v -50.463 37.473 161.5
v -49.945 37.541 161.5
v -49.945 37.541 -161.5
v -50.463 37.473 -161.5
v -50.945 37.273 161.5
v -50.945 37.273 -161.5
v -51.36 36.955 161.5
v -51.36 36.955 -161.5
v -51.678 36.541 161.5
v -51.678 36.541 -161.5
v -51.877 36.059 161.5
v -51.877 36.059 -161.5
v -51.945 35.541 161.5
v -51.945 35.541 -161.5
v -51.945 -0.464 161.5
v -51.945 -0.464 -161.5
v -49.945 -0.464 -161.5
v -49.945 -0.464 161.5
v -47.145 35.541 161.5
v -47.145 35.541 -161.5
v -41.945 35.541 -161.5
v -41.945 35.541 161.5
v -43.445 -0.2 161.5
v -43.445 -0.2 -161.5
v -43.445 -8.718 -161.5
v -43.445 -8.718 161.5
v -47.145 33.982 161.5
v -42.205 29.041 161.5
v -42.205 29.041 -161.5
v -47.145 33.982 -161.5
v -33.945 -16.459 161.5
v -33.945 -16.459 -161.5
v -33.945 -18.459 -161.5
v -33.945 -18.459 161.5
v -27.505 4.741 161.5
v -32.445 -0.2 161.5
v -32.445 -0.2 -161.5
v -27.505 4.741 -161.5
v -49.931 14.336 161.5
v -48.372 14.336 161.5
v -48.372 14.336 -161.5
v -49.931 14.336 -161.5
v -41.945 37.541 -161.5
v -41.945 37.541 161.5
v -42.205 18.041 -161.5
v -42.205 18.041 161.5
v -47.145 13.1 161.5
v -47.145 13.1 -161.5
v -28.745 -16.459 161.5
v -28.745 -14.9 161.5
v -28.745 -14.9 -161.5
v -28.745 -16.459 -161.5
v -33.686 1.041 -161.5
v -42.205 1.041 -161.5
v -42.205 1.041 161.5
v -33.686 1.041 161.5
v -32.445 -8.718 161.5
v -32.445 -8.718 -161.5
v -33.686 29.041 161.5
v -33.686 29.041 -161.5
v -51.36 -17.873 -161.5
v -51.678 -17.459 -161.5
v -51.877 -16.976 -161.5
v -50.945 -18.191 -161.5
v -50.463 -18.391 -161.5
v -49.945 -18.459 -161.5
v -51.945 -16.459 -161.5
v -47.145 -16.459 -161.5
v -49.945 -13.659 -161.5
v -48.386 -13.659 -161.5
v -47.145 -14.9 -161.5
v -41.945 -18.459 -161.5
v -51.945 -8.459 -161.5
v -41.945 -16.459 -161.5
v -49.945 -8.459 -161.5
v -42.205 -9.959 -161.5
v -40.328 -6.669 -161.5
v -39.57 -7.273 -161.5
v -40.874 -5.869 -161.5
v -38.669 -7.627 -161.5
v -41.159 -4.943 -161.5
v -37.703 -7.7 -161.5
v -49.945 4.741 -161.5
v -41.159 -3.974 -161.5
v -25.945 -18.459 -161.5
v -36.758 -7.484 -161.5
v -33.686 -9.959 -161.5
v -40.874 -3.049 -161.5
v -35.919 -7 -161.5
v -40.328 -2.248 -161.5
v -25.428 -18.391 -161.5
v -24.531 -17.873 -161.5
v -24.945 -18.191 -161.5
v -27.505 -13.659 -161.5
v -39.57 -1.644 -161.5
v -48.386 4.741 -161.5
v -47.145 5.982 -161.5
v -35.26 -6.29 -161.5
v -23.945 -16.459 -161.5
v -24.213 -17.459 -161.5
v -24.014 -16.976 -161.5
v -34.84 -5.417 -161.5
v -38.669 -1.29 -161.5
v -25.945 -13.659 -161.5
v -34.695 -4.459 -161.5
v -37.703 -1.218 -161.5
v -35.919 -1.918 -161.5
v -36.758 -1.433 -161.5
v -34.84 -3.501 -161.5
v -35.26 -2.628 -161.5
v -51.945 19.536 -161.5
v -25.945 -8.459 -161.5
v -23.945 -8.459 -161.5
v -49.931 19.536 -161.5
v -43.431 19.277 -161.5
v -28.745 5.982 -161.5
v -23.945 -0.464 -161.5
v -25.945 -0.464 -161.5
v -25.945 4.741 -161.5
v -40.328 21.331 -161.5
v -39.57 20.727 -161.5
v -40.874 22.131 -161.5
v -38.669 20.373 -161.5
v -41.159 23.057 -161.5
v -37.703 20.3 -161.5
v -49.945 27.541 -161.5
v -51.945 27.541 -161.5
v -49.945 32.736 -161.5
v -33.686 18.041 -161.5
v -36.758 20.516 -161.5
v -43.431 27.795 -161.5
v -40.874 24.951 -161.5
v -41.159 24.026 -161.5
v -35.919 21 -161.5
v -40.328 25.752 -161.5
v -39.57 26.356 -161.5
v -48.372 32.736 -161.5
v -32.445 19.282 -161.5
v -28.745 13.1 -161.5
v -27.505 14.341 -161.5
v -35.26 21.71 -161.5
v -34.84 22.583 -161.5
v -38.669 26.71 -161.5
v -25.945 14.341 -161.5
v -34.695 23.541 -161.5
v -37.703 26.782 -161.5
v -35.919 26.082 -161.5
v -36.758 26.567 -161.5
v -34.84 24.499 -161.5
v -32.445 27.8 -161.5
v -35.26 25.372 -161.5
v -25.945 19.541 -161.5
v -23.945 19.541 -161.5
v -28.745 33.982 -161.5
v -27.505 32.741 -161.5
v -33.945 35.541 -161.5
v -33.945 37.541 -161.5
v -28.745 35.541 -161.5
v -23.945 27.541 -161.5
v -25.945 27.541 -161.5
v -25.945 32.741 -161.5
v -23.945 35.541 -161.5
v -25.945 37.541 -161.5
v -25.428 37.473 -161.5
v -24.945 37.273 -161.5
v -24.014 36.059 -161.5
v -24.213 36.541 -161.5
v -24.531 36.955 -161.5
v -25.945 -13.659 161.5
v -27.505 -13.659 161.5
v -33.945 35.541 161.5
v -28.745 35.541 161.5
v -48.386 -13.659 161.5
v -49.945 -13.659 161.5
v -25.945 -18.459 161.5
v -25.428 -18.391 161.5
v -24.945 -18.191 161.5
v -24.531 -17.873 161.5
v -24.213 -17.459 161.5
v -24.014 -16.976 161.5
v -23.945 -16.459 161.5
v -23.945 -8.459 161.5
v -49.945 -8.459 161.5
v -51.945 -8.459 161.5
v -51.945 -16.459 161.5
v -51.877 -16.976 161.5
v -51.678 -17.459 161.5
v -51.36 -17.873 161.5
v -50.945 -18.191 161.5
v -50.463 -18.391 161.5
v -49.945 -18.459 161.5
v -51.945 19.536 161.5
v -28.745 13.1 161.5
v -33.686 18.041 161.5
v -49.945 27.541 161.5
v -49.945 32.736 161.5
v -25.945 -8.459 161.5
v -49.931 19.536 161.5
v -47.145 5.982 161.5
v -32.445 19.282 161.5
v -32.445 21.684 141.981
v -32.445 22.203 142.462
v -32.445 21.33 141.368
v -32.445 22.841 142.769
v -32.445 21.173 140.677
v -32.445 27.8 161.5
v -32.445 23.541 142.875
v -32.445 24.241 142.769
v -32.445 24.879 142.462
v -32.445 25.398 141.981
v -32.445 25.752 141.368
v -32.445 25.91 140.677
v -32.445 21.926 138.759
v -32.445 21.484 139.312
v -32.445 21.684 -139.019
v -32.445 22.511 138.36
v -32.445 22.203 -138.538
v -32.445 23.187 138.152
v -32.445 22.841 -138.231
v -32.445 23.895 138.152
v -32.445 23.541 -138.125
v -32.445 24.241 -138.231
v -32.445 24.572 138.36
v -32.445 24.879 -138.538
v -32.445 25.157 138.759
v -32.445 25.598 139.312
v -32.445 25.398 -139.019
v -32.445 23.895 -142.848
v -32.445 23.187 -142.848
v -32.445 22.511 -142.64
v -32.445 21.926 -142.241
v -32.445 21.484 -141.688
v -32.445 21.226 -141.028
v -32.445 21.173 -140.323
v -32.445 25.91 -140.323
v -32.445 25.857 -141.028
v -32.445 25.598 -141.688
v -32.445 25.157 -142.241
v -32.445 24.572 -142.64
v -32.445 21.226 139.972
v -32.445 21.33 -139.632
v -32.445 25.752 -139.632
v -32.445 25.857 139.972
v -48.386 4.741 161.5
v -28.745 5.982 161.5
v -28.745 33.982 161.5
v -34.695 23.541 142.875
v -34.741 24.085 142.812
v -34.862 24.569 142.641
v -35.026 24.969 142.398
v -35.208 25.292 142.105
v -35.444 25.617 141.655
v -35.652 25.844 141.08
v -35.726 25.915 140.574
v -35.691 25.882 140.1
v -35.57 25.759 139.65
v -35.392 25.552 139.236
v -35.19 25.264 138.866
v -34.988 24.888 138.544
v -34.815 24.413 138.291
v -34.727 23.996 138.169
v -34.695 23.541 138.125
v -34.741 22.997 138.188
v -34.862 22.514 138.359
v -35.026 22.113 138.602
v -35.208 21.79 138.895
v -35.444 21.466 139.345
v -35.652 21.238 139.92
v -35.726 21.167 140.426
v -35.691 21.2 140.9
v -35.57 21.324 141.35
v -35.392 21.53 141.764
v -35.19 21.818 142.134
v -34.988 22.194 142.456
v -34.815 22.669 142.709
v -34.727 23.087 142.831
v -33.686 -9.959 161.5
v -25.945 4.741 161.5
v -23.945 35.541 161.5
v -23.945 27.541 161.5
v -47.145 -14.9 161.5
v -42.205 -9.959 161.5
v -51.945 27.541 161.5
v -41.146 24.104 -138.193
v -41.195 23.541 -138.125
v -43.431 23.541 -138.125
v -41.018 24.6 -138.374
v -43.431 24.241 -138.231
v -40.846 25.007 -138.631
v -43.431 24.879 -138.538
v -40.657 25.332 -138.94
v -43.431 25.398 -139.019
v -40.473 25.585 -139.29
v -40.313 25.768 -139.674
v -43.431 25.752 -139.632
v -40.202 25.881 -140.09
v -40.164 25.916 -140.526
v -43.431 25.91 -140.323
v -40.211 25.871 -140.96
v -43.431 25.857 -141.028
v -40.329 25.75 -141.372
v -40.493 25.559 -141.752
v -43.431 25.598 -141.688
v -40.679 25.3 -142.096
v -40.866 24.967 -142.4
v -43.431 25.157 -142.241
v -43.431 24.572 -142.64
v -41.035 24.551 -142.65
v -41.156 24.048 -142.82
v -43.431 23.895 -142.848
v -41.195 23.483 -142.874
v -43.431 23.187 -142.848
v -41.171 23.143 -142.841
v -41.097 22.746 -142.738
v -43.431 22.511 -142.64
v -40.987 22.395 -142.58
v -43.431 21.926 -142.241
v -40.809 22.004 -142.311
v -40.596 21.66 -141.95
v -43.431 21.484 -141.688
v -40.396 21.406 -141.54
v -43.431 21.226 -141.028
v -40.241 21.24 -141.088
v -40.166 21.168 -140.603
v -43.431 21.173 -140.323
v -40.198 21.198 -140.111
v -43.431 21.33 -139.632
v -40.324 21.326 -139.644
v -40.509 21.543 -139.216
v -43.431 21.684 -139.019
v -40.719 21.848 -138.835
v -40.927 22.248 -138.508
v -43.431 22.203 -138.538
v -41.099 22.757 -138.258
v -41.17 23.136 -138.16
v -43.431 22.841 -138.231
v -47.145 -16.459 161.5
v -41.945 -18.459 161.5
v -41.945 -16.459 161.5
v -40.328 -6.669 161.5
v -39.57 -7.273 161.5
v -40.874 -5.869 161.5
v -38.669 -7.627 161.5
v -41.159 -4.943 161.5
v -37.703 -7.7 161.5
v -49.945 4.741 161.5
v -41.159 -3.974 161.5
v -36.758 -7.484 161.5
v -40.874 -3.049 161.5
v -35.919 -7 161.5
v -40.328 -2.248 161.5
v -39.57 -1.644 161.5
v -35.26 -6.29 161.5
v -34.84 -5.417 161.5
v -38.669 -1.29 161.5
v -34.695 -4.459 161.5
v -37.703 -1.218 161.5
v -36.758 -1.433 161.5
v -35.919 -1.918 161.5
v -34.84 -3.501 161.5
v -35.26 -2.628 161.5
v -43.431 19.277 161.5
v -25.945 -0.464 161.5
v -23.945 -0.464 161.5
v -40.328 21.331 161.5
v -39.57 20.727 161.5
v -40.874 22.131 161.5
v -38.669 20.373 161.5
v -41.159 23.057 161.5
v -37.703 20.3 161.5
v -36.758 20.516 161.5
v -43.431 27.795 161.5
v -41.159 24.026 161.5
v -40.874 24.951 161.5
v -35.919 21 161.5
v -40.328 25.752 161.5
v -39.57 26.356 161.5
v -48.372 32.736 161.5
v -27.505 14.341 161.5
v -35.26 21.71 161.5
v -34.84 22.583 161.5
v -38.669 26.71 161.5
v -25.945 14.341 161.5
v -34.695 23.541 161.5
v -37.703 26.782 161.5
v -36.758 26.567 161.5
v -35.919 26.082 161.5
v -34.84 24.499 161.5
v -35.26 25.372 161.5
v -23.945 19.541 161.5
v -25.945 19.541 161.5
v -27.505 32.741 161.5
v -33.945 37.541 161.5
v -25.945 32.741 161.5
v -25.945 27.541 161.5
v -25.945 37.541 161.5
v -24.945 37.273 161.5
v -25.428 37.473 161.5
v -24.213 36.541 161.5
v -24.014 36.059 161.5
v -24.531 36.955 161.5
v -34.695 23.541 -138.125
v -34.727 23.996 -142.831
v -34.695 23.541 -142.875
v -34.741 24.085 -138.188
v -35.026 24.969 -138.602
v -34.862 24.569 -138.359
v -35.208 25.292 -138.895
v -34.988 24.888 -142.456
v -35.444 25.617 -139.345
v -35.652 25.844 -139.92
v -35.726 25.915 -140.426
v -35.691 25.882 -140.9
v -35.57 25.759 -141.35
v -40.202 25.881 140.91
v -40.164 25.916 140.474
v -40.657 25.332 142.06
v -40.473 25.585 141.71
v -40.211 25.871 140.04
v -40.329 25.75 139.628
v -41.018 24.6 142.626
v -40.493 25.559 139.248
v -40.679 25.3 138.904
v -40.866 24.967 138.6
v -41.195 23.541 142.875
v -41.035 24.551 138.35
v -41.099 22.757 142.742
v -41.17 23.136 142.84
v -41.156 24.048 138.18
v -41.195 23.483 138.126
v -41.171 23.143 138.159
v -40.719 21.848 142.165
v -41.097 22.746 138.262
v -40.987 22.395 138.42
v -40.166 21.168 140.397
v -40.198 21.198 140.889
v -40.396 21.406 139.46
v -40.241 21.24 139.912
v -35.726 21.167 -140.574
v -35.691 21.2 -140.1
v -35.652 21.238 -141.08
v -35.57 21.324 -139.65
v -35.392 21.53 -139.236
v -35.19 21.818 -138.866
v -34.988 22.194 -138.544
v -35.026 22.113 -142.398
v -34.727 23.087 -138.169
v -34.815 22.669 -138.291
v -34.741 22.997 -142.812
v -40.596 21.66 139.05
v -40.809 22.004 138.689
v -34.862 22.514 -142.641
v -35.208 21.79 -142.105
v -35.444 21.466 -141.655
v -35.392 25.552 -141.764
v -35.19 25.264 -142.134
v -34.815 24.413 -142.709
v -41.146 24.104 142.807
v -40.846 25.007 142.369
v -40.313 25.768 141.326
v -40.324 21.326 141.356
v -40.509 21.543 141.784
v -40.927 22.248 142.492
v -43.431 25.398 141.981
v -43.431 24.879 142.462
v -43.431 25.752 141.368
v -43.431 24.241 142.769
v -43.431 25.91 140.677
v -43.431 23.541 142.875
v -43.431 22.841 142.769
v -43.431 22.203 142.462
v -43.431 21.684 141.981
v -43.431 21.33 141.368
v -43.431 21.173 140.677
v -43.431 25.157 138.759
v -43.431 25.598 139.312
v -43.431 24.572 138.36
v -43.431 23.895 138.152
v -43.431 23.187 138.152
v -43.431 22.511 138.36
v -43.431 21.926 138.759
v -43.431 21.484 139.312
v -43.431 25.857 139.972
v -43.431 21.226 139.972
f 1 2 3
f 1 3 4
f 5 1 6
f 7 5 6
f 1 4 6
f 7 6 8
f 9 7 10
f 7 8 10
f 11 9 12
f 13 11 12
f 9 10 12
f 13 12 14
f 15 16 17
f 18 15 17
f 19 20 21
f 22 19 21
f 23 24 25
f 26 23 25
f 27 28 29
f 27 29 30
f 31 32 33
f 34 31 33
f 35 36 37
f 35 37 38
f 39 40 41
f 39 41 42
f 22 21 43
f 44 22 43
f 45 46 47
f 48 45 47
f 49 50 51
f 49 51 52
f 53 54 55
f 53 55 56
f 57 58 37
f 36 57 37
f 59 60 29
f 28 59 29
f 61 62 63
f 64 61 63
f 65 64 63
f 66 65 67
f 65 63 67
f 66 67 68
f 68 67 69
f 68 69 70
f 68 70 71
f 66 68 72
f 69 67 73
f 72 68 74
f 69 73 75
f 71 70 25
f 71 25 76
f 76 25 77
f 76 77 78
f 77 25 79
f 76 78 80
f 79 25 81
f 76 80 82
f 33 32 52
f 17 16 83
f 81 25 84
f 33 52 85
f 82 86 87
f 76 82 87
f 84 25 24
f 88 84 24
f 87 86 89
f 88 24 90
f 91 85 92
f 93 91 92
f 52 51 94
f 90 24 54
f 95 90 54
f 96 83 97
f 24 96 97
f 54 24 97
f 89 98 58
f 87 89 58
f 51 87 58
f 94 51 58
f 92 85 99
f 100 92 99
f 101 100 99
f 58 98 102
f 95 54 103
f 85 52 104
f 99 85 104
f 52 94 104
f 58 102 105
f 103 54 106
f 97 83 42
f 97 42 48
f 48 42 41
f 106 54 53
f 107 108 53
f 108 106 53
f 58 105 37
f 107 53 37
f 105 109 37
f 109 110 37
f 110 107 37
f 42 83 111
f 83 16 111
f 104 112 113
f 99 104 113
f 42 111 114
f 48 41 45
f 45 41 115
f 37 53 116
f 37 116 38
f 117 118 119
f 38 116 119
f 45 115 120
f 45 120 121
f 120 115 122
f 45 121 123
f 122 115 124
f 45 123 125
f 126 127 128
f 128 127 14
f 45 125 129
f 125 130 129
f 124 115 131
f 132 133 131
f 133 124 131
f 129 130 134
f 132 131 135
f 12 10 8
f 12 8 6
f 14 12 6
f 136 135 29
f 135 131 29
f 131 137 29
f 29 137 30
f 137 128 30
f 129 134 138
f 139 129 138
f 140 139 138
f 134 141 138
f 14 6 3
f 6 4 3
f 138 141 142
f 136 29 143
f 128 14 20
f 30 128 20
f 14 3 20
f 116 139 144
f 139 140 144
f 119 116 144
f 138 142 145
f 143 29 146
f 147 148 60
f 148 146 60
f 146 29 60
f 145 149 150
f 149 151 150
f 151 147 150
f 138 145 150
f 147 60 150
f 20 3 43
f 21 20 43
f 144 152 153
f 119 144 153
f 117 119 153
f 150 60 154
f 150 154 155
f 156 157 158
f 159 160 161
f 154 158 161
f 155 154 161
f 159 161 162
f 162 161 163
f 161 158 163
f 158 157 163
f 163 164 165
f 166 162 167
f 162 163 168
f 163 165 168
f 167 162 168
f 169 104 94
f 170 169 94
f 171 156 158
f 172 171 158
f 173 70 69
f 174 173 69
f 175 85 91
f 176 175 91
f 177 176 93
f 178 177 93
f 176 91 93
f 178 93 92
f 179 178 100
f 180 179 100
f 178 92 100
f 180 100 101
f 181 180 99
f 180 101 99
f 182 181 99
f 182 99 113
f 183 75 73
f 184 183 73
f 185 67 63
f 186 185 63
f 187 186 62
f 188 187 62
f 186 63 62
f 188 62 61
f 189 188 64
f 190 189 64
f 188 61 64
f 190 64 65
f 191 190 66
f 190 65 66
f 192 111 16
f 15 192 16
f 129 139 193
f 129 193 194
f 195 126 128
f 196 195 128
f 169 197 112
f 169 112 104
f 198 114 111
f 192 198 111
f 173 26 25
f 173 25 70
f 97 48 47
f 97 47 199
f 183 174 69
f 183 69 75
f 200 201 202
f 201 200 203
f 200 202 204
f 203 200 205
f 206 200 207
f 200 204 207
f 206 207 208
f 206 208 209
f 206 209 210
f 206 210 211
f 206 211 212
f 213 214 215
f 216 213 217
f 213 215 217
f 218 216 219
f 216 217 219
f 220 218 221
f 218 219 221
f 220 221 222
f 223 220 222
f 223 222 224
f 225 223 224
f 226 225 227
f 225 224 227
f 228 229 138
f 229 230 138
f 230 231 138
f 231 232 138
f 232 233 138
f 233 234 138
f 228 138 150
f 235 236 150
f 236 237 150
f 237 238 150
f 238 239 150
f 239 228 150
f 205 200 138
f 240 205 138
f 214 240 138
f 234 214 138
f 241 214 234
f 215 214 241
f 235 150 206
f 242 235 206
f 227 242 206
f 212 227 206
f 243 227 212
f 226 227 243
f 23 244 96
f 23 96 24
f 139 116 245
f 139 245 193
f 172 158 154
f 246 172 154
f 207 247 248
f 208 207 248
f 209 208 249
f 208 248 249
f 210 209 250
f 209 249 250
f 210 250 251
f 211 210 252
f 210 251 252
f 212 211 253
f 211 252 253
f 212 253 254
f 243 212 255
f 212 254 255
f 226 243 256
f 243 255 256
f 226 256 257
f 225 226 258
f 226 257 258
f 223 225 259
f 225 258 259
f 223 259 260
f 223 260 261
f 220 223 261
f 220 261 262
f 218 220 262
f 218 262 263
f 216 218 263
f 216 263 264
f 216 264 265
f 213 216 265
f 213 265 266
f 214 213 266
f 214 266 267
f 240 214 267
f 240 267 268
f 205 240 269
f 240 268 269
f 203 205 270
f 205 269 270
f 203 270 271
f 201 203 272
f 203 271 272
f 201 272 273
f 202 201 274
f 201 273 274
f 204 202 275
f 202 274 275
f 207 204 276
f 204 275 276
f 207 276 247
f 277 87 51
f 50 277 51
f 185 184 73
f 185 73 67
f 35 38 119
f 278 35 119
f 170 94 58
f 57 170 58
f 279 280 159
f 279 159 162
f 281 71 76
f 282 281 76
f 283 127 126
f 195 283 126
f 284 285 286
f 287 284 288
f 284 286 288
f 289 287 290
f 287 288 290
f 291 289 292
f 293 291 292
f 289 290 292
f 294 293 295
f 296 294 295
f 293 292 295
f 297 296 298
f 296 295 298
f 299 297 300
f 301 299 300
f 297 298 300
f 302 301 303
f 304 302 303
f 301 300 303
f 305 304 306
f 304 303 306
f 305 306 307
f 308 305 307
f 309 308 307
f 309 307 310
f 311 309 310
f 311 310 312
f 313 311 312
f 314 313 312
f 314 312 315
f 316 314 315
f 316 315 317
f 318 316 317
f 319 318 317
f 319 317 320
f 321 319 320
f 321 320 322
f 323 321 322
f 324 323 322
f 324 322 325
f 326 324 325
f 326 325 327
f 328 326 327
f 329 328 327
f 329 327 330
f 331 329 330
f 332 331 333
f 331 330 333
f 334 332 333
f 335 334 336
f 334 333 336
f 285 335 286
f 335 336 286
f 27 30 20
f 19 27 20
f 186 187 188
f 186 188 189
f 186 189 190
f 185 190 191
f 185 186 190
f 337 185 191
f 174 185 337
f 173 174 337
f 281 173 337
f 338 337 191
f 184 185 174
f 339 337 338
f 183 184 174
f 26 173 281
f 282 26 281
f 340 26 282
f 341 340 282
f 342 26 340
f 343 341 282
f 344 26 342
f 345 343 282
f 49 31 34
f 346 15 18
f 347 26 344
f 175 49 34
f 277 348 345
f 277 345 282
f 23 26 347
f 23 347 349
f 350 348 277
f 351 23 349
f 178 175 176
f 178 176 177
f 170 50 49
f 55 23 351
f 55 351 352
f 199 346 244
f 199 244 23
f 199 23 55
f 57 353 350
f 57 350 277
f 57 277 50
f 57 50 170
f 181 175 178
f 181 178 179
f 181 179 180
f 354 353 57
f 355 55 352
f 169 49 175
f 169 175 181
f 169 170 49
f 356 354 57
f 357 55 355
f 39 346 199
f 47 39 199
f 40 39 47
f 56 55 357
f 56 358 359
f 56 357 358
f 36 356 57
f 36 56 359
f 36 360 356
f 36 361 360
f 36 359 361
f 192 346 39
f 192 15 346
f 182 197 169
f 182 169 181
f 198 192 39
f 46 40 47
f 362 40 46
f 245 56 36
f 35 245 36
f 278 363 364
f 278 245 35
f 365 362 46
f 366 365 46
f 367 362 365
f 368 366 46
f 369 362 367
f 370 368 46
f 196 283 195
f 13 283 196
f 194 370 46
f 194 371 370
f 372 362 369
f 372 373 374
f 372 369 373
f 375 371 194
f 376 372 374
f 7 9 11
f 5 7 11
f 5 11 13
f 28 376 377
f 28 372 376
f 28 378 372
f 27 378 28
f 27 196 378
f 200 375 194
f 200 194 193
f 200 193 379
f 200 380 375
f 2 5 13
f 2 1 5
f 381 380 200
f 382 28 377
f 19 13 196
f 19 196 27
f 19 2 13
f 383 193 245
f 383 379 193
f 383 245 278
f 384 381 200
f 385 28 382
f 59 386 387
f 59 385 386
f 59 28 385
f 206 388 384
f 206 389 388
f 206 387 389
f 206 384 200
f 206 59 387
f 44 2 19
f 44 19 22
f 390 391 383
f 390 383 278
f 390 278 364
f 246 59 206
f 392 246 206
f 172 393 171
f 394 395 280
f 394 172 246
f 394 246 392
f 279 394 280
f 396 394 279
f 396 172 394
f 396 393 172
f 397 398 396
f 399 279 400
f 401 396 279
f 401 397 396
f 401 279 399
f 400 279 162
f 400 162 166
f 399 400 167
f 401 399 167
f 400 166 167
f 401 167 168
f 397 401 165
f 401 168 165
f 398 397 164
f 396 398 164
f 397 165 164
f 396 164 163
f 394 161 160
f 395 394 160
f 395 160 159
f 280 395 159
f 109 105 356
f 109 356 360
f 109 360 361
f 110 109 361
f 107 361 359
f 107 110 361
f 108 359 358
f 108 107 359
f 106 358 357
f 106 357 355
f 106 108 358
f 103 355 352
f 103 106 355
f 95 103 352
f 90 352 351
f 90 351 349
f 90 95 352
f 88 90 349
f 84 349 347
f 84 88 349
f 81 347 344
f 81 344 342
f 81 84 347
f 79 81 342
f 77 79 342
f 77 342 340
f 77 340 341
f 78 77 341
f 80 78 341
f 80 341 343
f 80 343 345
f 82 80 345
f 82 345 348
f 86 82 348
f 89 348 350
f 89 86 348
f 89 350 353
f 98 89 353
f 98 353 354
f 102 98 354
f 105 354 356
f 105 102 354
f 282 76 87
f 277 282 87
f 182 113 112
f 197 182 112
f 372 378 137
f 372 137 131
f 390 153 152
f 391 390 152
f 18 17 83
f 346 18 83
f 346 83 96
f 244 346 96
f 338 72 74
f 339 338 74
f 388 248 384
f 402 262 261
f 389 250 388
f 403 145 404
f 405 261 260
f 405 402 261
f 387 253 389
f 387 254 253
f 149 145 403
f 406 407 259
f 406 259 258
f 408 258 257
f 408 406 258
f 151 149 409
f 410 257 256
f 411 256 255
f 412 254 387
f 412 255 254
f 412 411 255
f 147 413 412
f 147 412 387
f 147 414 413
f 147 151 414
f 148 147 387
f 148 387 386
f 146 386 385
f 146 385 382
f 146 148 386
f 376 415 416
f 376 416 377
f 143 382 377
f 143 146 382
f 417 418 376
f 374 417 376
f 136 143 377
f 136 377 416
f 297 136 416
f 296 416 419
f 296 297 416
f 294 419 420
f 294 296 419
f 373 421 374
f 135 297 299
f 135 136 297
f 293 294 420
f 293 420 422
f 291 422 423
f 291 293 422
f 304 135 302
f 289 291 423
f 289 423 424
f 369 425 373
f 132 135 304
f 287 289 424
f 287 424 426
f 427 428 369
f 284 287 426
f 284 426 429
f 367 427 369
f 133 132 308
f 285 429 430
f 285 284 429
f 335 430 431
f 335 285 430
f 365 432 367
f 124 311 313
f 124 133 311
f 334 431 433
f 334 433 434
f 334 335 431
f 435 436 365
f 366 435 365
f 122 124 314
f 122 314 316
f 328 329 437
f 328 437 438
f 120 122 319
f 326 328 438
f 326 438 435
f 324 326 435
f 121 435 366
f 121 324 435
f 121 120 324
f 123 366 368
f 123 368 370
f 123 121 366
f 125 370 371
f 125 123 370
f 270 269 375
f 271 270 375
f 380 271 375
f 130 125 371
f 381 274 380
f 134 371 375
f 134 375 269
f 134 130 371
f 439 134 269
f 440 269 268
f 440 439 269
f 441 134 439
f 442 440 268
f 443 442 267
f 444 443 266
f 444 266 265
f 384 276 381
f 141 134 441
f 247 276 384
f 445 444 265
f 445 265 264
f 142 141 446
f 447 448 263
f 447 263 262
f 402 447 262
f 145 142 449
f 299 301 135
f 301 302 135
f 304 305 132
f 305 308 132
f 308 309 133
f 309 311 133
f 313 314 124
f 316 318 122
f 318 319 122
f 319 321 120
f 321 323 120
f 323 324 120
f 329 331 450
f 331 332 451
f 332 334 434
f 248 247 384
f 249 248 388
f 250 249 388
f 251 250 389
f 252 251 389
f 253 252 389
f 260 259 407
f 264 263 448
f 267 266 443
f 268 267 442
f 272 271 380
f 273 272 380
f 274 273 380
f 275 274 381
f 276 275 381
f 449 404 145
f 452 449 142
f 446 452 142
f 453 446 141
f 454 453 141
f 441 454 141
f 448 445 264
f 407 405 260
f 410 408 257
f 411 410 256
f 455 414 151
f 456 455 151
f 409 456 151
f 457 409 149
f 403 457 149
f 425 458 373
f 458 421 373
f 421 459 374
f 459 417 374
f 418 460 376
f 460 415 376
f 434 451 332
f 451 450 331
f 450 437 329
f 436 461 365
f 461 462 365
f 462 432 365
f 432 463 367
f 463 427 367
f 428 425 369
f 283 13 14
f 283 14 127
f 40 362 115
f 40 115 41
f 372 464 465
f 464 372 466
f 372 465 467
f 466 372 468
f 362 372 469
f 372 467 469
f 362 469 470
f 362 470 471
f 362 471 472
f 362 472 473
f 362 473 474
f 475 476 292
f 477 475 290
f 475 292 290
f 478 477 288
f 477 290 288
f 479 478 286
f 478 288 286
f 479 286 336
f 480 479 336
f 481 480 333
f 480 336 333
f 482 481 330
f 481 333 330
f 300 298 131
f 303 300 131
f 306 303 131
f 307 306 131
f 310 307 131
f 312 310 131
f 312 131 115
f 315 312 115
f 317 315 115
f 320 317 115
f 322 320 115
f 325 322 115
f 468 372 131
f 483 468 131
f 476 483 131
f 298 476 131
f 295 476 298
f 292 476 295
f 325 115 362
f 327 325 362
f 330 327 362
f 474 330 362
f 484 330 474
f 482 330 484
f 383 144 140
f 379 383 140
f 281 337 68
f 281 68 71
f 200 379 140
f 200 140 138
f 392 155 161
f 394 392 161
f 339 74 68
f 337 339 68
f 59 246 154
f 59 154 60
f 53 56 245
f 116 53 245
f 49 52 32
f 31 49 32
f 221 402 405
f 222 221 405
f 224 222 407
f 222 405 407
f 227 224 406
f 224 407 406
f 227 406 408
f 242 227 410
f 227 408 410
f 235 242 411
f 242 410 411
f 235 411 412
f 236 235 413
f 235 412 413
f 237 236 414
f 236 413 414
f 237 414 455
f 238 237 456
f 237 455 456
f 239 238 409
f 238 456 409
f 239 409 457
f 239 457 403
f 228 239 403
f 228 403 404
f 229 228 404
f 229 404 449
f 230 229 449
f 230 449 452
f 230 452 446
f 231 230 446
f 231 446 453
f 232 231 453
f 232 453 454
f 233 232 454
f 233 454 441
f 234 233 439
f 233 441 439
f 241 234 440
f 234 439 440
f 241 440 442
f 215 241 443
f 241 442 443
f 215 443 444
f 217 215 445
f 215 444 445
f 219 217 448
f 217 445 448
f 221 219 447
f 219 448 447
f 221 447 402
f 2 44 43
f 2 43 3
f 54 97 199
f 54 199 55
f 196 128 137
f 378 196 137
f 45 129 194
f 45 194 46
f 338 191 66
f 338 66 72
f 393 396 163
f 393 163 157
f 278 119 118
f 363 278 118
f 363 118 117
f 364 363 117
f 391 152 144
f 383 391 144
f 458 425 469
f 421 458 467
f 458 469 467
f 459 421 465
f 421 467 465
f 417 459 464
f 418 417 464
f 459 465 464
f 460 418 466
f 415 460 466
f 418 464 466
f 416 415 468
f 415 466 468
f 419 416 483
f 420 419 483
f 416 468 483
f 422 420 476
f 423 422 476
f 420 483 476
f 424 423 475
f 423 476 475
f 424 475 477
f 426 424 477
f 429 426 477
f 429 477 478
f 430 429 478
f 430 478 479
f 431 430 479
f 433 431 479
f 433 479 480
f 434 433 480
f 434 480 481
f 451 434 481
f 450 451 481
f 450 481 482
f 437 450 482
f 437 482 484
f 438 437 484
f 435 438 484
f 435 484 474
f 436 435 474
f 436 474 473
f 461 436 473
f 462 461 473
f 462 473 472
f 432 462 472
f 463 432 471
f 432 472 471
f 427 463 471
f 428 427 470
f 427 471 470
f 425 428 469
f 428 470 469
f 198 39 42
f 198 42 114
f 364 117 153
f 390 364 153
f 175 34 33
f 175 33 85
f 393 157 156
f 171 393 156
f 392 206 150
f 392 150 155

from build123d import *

# Parameters (mm, degrees)
EXTRUSION2_DEPTH           = 161.5
EXTRUSION2_DEPTH_BACK      = 161.5
SKETCH1_R                  = 3.25
F_4_7_4_7_DIAMETER_HOLE1_D = 4.75


with BuildPart() as part:
    # Sketch1 → Extrusion2 (new, two sides: drawn at the far end of the back side and taken through both)
    with BuildSketch(Plane.XY.offset(-EXTRUSION2_DEPTH_BACK)):
        with BuildLine():
            Line((-51.945456549, 19.536039976), (-51.945456549, -0.463960024))
            Line((-51.945456549, -0.463960024), (-49.945456549, -0.463960024))
            Line((-49.945456549, -0.463960024), (-49.945456549, 4.741263919))
            Line((-49.945456549, 4.741263919), (-48.386244669, 4.741263919))
            Line((-48.386244669, 4.741263919), (-43.445456549, -0.1995242))
            Line((-43.445456549, -0.1995242), (-43.445456549, -8.717947961))
            Line((-43.445456549, -8.717947961), (-48.386244669, -13.658736081))
            Line((-48.386244669, -13.658736081), (-49.945456549, -13.658736081))
            Line((-49.945456549, -13.658736081), (-49.945456549, -8.458736081))
            Line((-49.945456549, -8.458736081), (-51.945456549, -8.458736081))
            Line((-51.945456549, -8.458736081), (-51.945456549, -16.458736081))
            ThreePointArc((-51.945456549, -16.458736081), (-51.359670111, -17.872949643), (-49.945456549, -18.458736081))
            Line((-49.945456549, -18.458736081), (-41.945456549, -18.458736081))
            Line((-41.945456549, -18.458736081), (-41.945456549, -16.458736081))
            Line((-41.945456549, -16.458736081), (-47.145456549, -16.458736081))
            Line((-47.145456549, -16.458736081), (-47.145456549, -14.8995242))
            Line((-47.145456549, -14.8995242), (-42.204668429, -9.958736081))
            Line((-42.204668429, -9.958736081), (-33.686244669, -9.958736081))
            Line((-33.686244669, -9.958736081), (-28.745456549, -14.8995242))
            Line((-28.745456549, -14.8995242), (-28.745456549, -16.458736081))
            Line((-28.745456549, -16.458736081), (-33.945456549, -16.458736081))
            Line((-33.945456549, -16.458736081), (-33.945456549, -18.458736081))
            Line((-33.945456549, -18.458736081), (-25.945456549, -18.458736081))
            ThreePointArc((-25.945456549, -18.458736081), (-24.531242987, -17.872949643), (-23.945456549, -16.458736081))
            Line((-23.945456549, -16.458736081), (-23.945456549, -8.458736081))
            Line((-23.945456549, -8.458736081), (-25.945456549, -8.458736081))
            Line((-25.945456549, -8.458736081), (-25.945456549, -13.658736081))
            Line((-25.945456549, -13.658736081), (-27.504668429, -13.658736081))
            Line((-27.504668429, -13.658736081), (-32.445456549, -8.717947961))
            Line((-32.445456549, -8.717947961), (-32.445456549, -0.1995242))
            Line((-32.445456549, -0.1995242), (-27.504668429, 4.741263919))
            Line((-27.504668429, 4.741263919), (-25.945456549, 4.741263919))
            Line((-25.945456549, 4.741263919), (-25.945456549, -0.463960024))
            Line((-25.945456549, -0.463960024), (-23.945456549, -0.463960024))
            Line((-23.945456549, -0.463960024), (-23.945456549, 19.541263919))
            Line((-23.945456549, 19.541263919), (-25.945456549, 19.541263919))
            Line((-25.945456549, 19.541263919), (-25.945456549, 14.341263919))
            Line((-25.945456549, 14.341263919), (-27.504668429, 14.341263919))
            Line((-27.504668429, 14.341263919), (-32.445456549, 19.282052039))
            Line((-32.445456549, 19.282052039), (-32.445456549, 27.8004758))
            Line((-32.445456549, 27.8004758), (-27.504668429, 32.741263919))
            Line((-27.504668429, 32.741263919), (-25.945456549, 32.741263919))
            Line((-25.945456549, 32.741263919), (-25.945456549, 27.541263919))
            Line((-25.945456549, 27.541263919), (-23.945456549, 27.541263919))
            Line((-23.945456549, 27.541263919), (-23.945456549, 35.541263919))
            ThreePointArc((-23.945456549, 35.541263919), (-24.531242987, 36.955477482), (-25.945456549, 37.541263919))
            Line((-25.945456549, 37.541263919), (-33.945456549, 37.541263919))
            Line((-33.945456549, 37.541263919), (-33.945456549, 35.541263919))
            Line((-33.945456549, 35.541263919), (-28.745456549, 35.541263919))
            Line((-28.745456549, 35.541263919), (-28.745456549, 33.982052039))
            Line((-28.745456549, 33.982052039), (-33.686244669, 29.041263919))
            Line((-33.686244669, 29.041263919), (-42.204668429, 29.041263919))
            Line((-42.204668429, 29.041263919), (-47.145456549, 33.982052039))
            Line((-47.145456549, 33.982052039), (-47.145456549, 35.541263919))
            Line((-47.145456549, 35.541263919), (-41.945456549, 35.541263919))
            Line((-41.945456549, 35.541263919), (-41.945456549, 37.541263919))
            Line((-41.945456549, 37.541263919), (-49.945456549, 37.541263919))
            ThreePointArc((-49.945456549, 37.541263919), (-51.359670111, 36.955477482), (-51.945456549, 35.541263919))
            Line((-51.945456549, 35.541263919), (-51.945456549, 27.541263919))
            Line((-51.945456549, 27.541263919), (-49.945456549, 27.541263919))
            Line((-49.945456549, 27.541263919), (-49.945456549, 32.736039976))
            Line((-49.945456549, 32.736039976), (-48.372120999, 32.736039976))
            Line((-48.372120999, 32.736039976), (-43.43133288, 27.795251856))
            Line((-43.43133288, 27.795251856), (-43.43133288, 19.276828096))
            Line((-43.43133288, 19.276828096), (-48.372120999, 14.336039976))
            Line((-48.372120999, 14.336039976), (-49.93133288, 14.336039976))
            Line((-49.93133288, 14.336039976), (-49.93133288, 19.536039976))
            Line((-49.93133288, 19.536039976), (-51.945456549, 19.536039976))
        make_face()
        with Locations((-37.945456549, -4.458736081)):
            Circle(SKETCH1_R, mode=Mode.SUBTRACT)
        with Locations((-37.945456549, 23.541263919)):
            Circle(SKETCH1_R, mode=Mode.SUBTRACT)
        Polygon((-33.686244669, 18.041263919), (-42.204668429, 18.041263919), (-47.145456549, 13.1004758), (-47.145456549, 5.982052039), (-42.204668429, 1.041263919), (-33.686244669, 1.041263919), (-28.745456549, 5.982052039), (-28.745456549, 13.1004758), align=None, mode=Mode.SUBTRACT)
    extrude(amount=EXTRUSION2_DEPTH + EXTRUSION2_DEPTH_BACK)

    # Ø4.7 (4.7) Diameter Hole1 (through all)
    with Locations(Plane(origin=(-23.945456549, 0, 0), x_dir=(0, 0, -1), z_dir=(1, 0, 0))):
        with Locations((-140.5, 23.541263919), (140.5, 23.541263919)):
            Hole(F_4_7_4_7_DIAMETER_HOLE1_D / 2)


solid = part.part
